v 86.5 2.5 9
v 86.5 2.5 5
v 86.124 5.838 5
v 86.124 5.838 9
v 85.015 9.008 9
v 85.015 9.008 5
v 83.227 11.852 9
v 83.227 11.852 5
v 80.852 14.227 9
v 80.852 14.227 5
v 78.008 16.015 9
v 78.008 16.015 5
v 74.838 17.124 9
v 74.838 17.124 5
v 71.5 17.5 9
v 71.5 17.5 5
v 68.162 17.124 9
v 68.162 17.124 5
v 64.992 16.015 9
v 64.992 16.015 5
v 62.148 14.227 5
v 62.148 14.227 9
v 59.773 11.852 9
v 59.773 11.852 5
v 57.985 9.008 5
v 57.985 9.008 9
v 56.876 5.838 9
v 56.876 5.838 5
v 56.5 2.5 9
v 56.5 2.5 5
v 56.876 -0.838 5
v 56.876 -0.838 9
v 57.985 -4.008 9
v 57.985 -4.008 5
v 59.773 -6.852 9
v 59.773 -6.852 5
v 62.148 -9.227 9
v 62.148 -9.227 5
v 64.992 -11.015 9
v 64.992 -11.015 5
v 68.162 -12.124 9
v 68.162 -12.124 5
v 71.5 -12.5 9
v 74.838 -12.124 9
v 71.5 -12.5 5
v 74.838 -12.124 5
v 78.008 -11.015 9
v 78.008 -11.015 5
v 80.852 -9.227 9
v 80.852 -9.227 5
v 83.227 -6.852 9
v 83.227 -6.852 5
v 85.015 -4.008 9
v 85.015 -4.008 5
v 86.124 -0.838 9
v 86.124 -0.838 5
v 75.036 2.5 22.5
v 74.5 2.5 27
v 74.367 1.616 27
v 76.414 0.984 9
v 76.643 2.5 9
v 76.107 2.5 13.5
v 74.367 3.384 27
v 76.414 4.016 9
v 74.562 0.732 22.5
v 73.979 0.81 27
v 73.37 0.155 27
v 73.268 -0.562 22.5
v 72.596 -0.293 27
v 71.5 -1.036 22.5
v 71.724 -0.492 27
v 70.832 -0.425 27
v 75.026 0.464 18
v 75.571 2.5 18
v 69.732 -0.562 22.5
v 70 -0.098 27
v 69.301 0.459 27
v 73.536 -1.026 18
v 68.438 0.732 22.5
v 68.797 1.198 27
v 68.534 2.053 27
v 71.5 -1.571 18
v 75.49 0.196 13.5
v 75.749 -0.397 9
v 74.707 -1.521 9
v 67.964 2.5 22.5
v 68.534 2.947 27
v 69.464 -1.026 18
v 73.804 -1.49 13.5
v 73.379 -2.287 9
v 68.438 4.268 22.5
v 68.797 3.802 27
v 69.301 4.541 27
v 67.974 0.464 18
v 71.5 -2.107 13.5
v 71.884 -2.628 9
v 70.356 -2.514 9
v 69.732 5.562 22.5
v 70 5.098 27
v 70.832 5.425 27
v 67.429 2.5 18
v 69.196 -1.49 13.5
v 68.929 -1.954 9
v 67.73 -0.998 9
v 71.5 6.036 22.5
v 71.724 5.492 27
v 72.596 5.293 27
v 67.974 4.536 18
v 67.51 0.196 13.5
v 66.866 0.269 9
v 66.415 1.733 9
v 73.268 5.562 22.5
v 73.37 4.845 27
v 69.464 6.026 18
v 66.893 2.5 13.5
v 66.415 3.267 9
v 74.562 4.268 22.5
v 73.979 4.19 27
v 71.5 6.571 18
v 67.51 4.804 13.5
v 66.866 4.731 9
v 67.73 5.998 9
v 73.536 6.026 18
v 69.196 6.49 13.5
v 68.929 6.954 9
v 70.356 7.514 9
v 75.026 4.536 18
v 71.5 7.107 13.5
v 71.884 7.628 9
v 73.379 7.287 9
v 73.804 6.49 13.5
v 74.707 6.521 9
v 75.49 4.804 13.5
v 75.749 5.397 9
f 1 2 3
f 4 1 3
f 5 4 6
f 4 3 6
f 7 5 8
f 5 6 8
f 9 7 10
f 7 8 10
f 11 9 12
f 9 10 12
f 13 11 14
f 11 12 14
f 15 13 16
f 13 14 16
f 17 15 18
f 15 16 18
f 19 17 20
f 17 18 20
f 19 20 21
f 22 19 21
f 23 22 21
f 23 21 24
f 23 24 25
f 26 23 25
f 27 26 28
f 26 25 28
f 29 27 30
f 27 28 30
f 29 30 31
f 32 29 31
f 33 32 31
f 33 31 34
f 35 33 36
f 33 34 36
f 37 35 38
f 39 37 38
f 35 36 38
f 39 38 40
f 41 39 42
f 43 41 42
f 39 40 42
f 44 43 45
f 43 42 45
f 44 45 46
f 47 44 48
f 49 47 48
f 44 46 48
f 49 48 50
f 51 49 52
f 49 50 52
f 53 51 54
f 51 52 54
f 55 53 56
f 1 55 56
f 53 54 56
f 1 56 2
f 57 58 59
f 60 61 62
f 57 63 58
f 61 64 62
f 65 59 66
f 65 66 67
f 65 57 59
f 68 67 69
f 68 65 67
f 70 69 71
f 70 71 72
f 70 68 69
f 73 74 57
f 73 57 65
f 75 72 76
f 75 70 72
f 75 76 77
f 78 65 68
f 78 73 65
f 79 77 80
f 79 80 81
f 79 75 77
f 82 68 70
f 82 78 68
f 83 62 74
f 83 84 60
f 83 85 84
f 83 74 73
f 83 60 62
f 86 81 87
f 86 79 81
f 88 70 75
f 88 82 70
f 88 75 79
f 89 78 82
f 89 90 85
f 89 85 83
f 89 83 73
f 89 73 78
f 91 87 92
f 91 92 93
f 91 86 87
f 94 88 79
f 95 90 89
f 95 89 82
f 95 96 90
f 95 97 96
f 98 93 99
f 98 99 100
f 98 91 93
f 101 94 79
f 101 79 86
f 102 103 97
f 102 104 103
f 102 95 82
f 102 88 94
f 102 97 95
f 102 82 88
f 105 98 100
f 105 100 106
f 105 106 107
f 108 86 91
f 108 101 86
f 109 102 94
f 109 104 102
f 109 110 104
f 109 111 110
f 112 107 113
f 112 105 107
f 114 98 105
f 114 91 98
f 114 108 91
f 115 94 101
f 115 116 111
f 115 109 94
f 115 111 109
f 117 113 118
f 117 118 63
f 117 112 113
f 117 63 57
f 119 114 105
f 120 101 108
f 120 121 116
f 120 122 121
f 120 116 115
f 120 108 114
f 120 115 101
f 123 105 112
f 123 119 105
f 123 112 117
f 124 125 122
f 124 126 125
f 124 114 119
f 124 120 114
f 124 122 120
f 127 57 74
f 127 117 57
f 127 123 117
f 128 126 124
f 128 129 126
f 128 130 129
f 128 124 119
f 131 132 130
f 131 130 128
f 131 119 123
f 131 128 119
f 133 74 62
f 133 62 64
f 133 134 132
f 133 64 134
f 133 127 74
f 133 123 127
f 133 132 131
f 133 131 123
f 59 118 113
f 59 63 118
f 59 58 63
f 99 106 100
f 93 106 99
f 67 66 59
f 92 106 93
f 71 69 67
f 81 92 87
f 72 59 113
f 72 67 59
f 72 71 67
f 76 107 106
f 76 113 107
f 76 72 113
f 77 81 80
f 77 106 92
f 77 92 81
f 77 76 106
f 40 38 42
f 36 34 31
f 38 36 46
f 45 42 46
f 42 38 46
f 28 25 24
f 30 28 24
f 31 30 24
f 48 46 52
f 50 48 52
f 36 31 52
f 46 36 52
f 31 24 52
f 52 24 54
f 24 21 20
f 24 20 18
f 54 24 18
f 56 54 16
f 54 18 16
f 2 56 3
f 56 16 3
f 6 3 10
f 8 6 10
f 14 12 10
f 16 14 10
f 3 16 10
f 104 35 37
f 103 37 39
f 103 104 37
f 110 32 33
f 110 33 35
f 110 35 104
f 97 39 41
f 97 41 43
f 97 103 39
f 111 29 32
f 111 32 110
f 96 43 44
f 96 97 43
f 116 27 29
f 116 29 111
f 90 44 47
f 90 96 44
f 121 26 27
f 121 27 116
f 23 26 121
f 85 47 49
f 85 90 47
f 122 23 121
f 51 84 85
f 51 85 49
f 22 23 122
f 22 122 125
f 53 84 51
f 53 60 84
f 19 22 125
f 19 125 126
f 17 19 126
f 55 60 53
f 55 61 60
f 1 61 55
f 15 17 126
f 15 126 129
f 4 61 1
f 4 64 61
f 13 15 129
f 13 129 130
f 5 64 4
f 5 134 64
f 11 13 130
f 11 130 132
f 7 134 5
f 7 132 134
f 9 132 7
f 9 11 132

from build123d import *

# Parameters (mm, degrees)
CYLINDER022_R     = 15
CYLINDER022_DEPTH = 4


with BuildPart() as cono_brazo_central_base:
    # Cone → Cone (revolve)
    with BuildSketch(Plane(origin=(71.5, 2.5, 27), x_dir=(1, 0, 0), z_dir=(0, 1, 0))):
        Polygon((0, 0), (3, 0), (5.5, 21), (0, 21), align=None)
    revolve(axis=Axis((71.5, 2.5, 27), (0, 0, -1)))


with BuildPart() as union_base_brazo_central:
    # Cylinder022 → Cylinder022 (new body)
    with BuildSketch(Plane(origin=(71.5, 2.5, 5), x_dir=(1, 0, 0), z_dir=(0, 0, 1))):
        Circle(CYLINDER022_R)
    extrude(amount=CYLINDER022_DEPTH)

    # Fusion015: union Cono brazo central/base
    add(cono_brazo_central_base.part)


solid = union_base_brazo_central.part
